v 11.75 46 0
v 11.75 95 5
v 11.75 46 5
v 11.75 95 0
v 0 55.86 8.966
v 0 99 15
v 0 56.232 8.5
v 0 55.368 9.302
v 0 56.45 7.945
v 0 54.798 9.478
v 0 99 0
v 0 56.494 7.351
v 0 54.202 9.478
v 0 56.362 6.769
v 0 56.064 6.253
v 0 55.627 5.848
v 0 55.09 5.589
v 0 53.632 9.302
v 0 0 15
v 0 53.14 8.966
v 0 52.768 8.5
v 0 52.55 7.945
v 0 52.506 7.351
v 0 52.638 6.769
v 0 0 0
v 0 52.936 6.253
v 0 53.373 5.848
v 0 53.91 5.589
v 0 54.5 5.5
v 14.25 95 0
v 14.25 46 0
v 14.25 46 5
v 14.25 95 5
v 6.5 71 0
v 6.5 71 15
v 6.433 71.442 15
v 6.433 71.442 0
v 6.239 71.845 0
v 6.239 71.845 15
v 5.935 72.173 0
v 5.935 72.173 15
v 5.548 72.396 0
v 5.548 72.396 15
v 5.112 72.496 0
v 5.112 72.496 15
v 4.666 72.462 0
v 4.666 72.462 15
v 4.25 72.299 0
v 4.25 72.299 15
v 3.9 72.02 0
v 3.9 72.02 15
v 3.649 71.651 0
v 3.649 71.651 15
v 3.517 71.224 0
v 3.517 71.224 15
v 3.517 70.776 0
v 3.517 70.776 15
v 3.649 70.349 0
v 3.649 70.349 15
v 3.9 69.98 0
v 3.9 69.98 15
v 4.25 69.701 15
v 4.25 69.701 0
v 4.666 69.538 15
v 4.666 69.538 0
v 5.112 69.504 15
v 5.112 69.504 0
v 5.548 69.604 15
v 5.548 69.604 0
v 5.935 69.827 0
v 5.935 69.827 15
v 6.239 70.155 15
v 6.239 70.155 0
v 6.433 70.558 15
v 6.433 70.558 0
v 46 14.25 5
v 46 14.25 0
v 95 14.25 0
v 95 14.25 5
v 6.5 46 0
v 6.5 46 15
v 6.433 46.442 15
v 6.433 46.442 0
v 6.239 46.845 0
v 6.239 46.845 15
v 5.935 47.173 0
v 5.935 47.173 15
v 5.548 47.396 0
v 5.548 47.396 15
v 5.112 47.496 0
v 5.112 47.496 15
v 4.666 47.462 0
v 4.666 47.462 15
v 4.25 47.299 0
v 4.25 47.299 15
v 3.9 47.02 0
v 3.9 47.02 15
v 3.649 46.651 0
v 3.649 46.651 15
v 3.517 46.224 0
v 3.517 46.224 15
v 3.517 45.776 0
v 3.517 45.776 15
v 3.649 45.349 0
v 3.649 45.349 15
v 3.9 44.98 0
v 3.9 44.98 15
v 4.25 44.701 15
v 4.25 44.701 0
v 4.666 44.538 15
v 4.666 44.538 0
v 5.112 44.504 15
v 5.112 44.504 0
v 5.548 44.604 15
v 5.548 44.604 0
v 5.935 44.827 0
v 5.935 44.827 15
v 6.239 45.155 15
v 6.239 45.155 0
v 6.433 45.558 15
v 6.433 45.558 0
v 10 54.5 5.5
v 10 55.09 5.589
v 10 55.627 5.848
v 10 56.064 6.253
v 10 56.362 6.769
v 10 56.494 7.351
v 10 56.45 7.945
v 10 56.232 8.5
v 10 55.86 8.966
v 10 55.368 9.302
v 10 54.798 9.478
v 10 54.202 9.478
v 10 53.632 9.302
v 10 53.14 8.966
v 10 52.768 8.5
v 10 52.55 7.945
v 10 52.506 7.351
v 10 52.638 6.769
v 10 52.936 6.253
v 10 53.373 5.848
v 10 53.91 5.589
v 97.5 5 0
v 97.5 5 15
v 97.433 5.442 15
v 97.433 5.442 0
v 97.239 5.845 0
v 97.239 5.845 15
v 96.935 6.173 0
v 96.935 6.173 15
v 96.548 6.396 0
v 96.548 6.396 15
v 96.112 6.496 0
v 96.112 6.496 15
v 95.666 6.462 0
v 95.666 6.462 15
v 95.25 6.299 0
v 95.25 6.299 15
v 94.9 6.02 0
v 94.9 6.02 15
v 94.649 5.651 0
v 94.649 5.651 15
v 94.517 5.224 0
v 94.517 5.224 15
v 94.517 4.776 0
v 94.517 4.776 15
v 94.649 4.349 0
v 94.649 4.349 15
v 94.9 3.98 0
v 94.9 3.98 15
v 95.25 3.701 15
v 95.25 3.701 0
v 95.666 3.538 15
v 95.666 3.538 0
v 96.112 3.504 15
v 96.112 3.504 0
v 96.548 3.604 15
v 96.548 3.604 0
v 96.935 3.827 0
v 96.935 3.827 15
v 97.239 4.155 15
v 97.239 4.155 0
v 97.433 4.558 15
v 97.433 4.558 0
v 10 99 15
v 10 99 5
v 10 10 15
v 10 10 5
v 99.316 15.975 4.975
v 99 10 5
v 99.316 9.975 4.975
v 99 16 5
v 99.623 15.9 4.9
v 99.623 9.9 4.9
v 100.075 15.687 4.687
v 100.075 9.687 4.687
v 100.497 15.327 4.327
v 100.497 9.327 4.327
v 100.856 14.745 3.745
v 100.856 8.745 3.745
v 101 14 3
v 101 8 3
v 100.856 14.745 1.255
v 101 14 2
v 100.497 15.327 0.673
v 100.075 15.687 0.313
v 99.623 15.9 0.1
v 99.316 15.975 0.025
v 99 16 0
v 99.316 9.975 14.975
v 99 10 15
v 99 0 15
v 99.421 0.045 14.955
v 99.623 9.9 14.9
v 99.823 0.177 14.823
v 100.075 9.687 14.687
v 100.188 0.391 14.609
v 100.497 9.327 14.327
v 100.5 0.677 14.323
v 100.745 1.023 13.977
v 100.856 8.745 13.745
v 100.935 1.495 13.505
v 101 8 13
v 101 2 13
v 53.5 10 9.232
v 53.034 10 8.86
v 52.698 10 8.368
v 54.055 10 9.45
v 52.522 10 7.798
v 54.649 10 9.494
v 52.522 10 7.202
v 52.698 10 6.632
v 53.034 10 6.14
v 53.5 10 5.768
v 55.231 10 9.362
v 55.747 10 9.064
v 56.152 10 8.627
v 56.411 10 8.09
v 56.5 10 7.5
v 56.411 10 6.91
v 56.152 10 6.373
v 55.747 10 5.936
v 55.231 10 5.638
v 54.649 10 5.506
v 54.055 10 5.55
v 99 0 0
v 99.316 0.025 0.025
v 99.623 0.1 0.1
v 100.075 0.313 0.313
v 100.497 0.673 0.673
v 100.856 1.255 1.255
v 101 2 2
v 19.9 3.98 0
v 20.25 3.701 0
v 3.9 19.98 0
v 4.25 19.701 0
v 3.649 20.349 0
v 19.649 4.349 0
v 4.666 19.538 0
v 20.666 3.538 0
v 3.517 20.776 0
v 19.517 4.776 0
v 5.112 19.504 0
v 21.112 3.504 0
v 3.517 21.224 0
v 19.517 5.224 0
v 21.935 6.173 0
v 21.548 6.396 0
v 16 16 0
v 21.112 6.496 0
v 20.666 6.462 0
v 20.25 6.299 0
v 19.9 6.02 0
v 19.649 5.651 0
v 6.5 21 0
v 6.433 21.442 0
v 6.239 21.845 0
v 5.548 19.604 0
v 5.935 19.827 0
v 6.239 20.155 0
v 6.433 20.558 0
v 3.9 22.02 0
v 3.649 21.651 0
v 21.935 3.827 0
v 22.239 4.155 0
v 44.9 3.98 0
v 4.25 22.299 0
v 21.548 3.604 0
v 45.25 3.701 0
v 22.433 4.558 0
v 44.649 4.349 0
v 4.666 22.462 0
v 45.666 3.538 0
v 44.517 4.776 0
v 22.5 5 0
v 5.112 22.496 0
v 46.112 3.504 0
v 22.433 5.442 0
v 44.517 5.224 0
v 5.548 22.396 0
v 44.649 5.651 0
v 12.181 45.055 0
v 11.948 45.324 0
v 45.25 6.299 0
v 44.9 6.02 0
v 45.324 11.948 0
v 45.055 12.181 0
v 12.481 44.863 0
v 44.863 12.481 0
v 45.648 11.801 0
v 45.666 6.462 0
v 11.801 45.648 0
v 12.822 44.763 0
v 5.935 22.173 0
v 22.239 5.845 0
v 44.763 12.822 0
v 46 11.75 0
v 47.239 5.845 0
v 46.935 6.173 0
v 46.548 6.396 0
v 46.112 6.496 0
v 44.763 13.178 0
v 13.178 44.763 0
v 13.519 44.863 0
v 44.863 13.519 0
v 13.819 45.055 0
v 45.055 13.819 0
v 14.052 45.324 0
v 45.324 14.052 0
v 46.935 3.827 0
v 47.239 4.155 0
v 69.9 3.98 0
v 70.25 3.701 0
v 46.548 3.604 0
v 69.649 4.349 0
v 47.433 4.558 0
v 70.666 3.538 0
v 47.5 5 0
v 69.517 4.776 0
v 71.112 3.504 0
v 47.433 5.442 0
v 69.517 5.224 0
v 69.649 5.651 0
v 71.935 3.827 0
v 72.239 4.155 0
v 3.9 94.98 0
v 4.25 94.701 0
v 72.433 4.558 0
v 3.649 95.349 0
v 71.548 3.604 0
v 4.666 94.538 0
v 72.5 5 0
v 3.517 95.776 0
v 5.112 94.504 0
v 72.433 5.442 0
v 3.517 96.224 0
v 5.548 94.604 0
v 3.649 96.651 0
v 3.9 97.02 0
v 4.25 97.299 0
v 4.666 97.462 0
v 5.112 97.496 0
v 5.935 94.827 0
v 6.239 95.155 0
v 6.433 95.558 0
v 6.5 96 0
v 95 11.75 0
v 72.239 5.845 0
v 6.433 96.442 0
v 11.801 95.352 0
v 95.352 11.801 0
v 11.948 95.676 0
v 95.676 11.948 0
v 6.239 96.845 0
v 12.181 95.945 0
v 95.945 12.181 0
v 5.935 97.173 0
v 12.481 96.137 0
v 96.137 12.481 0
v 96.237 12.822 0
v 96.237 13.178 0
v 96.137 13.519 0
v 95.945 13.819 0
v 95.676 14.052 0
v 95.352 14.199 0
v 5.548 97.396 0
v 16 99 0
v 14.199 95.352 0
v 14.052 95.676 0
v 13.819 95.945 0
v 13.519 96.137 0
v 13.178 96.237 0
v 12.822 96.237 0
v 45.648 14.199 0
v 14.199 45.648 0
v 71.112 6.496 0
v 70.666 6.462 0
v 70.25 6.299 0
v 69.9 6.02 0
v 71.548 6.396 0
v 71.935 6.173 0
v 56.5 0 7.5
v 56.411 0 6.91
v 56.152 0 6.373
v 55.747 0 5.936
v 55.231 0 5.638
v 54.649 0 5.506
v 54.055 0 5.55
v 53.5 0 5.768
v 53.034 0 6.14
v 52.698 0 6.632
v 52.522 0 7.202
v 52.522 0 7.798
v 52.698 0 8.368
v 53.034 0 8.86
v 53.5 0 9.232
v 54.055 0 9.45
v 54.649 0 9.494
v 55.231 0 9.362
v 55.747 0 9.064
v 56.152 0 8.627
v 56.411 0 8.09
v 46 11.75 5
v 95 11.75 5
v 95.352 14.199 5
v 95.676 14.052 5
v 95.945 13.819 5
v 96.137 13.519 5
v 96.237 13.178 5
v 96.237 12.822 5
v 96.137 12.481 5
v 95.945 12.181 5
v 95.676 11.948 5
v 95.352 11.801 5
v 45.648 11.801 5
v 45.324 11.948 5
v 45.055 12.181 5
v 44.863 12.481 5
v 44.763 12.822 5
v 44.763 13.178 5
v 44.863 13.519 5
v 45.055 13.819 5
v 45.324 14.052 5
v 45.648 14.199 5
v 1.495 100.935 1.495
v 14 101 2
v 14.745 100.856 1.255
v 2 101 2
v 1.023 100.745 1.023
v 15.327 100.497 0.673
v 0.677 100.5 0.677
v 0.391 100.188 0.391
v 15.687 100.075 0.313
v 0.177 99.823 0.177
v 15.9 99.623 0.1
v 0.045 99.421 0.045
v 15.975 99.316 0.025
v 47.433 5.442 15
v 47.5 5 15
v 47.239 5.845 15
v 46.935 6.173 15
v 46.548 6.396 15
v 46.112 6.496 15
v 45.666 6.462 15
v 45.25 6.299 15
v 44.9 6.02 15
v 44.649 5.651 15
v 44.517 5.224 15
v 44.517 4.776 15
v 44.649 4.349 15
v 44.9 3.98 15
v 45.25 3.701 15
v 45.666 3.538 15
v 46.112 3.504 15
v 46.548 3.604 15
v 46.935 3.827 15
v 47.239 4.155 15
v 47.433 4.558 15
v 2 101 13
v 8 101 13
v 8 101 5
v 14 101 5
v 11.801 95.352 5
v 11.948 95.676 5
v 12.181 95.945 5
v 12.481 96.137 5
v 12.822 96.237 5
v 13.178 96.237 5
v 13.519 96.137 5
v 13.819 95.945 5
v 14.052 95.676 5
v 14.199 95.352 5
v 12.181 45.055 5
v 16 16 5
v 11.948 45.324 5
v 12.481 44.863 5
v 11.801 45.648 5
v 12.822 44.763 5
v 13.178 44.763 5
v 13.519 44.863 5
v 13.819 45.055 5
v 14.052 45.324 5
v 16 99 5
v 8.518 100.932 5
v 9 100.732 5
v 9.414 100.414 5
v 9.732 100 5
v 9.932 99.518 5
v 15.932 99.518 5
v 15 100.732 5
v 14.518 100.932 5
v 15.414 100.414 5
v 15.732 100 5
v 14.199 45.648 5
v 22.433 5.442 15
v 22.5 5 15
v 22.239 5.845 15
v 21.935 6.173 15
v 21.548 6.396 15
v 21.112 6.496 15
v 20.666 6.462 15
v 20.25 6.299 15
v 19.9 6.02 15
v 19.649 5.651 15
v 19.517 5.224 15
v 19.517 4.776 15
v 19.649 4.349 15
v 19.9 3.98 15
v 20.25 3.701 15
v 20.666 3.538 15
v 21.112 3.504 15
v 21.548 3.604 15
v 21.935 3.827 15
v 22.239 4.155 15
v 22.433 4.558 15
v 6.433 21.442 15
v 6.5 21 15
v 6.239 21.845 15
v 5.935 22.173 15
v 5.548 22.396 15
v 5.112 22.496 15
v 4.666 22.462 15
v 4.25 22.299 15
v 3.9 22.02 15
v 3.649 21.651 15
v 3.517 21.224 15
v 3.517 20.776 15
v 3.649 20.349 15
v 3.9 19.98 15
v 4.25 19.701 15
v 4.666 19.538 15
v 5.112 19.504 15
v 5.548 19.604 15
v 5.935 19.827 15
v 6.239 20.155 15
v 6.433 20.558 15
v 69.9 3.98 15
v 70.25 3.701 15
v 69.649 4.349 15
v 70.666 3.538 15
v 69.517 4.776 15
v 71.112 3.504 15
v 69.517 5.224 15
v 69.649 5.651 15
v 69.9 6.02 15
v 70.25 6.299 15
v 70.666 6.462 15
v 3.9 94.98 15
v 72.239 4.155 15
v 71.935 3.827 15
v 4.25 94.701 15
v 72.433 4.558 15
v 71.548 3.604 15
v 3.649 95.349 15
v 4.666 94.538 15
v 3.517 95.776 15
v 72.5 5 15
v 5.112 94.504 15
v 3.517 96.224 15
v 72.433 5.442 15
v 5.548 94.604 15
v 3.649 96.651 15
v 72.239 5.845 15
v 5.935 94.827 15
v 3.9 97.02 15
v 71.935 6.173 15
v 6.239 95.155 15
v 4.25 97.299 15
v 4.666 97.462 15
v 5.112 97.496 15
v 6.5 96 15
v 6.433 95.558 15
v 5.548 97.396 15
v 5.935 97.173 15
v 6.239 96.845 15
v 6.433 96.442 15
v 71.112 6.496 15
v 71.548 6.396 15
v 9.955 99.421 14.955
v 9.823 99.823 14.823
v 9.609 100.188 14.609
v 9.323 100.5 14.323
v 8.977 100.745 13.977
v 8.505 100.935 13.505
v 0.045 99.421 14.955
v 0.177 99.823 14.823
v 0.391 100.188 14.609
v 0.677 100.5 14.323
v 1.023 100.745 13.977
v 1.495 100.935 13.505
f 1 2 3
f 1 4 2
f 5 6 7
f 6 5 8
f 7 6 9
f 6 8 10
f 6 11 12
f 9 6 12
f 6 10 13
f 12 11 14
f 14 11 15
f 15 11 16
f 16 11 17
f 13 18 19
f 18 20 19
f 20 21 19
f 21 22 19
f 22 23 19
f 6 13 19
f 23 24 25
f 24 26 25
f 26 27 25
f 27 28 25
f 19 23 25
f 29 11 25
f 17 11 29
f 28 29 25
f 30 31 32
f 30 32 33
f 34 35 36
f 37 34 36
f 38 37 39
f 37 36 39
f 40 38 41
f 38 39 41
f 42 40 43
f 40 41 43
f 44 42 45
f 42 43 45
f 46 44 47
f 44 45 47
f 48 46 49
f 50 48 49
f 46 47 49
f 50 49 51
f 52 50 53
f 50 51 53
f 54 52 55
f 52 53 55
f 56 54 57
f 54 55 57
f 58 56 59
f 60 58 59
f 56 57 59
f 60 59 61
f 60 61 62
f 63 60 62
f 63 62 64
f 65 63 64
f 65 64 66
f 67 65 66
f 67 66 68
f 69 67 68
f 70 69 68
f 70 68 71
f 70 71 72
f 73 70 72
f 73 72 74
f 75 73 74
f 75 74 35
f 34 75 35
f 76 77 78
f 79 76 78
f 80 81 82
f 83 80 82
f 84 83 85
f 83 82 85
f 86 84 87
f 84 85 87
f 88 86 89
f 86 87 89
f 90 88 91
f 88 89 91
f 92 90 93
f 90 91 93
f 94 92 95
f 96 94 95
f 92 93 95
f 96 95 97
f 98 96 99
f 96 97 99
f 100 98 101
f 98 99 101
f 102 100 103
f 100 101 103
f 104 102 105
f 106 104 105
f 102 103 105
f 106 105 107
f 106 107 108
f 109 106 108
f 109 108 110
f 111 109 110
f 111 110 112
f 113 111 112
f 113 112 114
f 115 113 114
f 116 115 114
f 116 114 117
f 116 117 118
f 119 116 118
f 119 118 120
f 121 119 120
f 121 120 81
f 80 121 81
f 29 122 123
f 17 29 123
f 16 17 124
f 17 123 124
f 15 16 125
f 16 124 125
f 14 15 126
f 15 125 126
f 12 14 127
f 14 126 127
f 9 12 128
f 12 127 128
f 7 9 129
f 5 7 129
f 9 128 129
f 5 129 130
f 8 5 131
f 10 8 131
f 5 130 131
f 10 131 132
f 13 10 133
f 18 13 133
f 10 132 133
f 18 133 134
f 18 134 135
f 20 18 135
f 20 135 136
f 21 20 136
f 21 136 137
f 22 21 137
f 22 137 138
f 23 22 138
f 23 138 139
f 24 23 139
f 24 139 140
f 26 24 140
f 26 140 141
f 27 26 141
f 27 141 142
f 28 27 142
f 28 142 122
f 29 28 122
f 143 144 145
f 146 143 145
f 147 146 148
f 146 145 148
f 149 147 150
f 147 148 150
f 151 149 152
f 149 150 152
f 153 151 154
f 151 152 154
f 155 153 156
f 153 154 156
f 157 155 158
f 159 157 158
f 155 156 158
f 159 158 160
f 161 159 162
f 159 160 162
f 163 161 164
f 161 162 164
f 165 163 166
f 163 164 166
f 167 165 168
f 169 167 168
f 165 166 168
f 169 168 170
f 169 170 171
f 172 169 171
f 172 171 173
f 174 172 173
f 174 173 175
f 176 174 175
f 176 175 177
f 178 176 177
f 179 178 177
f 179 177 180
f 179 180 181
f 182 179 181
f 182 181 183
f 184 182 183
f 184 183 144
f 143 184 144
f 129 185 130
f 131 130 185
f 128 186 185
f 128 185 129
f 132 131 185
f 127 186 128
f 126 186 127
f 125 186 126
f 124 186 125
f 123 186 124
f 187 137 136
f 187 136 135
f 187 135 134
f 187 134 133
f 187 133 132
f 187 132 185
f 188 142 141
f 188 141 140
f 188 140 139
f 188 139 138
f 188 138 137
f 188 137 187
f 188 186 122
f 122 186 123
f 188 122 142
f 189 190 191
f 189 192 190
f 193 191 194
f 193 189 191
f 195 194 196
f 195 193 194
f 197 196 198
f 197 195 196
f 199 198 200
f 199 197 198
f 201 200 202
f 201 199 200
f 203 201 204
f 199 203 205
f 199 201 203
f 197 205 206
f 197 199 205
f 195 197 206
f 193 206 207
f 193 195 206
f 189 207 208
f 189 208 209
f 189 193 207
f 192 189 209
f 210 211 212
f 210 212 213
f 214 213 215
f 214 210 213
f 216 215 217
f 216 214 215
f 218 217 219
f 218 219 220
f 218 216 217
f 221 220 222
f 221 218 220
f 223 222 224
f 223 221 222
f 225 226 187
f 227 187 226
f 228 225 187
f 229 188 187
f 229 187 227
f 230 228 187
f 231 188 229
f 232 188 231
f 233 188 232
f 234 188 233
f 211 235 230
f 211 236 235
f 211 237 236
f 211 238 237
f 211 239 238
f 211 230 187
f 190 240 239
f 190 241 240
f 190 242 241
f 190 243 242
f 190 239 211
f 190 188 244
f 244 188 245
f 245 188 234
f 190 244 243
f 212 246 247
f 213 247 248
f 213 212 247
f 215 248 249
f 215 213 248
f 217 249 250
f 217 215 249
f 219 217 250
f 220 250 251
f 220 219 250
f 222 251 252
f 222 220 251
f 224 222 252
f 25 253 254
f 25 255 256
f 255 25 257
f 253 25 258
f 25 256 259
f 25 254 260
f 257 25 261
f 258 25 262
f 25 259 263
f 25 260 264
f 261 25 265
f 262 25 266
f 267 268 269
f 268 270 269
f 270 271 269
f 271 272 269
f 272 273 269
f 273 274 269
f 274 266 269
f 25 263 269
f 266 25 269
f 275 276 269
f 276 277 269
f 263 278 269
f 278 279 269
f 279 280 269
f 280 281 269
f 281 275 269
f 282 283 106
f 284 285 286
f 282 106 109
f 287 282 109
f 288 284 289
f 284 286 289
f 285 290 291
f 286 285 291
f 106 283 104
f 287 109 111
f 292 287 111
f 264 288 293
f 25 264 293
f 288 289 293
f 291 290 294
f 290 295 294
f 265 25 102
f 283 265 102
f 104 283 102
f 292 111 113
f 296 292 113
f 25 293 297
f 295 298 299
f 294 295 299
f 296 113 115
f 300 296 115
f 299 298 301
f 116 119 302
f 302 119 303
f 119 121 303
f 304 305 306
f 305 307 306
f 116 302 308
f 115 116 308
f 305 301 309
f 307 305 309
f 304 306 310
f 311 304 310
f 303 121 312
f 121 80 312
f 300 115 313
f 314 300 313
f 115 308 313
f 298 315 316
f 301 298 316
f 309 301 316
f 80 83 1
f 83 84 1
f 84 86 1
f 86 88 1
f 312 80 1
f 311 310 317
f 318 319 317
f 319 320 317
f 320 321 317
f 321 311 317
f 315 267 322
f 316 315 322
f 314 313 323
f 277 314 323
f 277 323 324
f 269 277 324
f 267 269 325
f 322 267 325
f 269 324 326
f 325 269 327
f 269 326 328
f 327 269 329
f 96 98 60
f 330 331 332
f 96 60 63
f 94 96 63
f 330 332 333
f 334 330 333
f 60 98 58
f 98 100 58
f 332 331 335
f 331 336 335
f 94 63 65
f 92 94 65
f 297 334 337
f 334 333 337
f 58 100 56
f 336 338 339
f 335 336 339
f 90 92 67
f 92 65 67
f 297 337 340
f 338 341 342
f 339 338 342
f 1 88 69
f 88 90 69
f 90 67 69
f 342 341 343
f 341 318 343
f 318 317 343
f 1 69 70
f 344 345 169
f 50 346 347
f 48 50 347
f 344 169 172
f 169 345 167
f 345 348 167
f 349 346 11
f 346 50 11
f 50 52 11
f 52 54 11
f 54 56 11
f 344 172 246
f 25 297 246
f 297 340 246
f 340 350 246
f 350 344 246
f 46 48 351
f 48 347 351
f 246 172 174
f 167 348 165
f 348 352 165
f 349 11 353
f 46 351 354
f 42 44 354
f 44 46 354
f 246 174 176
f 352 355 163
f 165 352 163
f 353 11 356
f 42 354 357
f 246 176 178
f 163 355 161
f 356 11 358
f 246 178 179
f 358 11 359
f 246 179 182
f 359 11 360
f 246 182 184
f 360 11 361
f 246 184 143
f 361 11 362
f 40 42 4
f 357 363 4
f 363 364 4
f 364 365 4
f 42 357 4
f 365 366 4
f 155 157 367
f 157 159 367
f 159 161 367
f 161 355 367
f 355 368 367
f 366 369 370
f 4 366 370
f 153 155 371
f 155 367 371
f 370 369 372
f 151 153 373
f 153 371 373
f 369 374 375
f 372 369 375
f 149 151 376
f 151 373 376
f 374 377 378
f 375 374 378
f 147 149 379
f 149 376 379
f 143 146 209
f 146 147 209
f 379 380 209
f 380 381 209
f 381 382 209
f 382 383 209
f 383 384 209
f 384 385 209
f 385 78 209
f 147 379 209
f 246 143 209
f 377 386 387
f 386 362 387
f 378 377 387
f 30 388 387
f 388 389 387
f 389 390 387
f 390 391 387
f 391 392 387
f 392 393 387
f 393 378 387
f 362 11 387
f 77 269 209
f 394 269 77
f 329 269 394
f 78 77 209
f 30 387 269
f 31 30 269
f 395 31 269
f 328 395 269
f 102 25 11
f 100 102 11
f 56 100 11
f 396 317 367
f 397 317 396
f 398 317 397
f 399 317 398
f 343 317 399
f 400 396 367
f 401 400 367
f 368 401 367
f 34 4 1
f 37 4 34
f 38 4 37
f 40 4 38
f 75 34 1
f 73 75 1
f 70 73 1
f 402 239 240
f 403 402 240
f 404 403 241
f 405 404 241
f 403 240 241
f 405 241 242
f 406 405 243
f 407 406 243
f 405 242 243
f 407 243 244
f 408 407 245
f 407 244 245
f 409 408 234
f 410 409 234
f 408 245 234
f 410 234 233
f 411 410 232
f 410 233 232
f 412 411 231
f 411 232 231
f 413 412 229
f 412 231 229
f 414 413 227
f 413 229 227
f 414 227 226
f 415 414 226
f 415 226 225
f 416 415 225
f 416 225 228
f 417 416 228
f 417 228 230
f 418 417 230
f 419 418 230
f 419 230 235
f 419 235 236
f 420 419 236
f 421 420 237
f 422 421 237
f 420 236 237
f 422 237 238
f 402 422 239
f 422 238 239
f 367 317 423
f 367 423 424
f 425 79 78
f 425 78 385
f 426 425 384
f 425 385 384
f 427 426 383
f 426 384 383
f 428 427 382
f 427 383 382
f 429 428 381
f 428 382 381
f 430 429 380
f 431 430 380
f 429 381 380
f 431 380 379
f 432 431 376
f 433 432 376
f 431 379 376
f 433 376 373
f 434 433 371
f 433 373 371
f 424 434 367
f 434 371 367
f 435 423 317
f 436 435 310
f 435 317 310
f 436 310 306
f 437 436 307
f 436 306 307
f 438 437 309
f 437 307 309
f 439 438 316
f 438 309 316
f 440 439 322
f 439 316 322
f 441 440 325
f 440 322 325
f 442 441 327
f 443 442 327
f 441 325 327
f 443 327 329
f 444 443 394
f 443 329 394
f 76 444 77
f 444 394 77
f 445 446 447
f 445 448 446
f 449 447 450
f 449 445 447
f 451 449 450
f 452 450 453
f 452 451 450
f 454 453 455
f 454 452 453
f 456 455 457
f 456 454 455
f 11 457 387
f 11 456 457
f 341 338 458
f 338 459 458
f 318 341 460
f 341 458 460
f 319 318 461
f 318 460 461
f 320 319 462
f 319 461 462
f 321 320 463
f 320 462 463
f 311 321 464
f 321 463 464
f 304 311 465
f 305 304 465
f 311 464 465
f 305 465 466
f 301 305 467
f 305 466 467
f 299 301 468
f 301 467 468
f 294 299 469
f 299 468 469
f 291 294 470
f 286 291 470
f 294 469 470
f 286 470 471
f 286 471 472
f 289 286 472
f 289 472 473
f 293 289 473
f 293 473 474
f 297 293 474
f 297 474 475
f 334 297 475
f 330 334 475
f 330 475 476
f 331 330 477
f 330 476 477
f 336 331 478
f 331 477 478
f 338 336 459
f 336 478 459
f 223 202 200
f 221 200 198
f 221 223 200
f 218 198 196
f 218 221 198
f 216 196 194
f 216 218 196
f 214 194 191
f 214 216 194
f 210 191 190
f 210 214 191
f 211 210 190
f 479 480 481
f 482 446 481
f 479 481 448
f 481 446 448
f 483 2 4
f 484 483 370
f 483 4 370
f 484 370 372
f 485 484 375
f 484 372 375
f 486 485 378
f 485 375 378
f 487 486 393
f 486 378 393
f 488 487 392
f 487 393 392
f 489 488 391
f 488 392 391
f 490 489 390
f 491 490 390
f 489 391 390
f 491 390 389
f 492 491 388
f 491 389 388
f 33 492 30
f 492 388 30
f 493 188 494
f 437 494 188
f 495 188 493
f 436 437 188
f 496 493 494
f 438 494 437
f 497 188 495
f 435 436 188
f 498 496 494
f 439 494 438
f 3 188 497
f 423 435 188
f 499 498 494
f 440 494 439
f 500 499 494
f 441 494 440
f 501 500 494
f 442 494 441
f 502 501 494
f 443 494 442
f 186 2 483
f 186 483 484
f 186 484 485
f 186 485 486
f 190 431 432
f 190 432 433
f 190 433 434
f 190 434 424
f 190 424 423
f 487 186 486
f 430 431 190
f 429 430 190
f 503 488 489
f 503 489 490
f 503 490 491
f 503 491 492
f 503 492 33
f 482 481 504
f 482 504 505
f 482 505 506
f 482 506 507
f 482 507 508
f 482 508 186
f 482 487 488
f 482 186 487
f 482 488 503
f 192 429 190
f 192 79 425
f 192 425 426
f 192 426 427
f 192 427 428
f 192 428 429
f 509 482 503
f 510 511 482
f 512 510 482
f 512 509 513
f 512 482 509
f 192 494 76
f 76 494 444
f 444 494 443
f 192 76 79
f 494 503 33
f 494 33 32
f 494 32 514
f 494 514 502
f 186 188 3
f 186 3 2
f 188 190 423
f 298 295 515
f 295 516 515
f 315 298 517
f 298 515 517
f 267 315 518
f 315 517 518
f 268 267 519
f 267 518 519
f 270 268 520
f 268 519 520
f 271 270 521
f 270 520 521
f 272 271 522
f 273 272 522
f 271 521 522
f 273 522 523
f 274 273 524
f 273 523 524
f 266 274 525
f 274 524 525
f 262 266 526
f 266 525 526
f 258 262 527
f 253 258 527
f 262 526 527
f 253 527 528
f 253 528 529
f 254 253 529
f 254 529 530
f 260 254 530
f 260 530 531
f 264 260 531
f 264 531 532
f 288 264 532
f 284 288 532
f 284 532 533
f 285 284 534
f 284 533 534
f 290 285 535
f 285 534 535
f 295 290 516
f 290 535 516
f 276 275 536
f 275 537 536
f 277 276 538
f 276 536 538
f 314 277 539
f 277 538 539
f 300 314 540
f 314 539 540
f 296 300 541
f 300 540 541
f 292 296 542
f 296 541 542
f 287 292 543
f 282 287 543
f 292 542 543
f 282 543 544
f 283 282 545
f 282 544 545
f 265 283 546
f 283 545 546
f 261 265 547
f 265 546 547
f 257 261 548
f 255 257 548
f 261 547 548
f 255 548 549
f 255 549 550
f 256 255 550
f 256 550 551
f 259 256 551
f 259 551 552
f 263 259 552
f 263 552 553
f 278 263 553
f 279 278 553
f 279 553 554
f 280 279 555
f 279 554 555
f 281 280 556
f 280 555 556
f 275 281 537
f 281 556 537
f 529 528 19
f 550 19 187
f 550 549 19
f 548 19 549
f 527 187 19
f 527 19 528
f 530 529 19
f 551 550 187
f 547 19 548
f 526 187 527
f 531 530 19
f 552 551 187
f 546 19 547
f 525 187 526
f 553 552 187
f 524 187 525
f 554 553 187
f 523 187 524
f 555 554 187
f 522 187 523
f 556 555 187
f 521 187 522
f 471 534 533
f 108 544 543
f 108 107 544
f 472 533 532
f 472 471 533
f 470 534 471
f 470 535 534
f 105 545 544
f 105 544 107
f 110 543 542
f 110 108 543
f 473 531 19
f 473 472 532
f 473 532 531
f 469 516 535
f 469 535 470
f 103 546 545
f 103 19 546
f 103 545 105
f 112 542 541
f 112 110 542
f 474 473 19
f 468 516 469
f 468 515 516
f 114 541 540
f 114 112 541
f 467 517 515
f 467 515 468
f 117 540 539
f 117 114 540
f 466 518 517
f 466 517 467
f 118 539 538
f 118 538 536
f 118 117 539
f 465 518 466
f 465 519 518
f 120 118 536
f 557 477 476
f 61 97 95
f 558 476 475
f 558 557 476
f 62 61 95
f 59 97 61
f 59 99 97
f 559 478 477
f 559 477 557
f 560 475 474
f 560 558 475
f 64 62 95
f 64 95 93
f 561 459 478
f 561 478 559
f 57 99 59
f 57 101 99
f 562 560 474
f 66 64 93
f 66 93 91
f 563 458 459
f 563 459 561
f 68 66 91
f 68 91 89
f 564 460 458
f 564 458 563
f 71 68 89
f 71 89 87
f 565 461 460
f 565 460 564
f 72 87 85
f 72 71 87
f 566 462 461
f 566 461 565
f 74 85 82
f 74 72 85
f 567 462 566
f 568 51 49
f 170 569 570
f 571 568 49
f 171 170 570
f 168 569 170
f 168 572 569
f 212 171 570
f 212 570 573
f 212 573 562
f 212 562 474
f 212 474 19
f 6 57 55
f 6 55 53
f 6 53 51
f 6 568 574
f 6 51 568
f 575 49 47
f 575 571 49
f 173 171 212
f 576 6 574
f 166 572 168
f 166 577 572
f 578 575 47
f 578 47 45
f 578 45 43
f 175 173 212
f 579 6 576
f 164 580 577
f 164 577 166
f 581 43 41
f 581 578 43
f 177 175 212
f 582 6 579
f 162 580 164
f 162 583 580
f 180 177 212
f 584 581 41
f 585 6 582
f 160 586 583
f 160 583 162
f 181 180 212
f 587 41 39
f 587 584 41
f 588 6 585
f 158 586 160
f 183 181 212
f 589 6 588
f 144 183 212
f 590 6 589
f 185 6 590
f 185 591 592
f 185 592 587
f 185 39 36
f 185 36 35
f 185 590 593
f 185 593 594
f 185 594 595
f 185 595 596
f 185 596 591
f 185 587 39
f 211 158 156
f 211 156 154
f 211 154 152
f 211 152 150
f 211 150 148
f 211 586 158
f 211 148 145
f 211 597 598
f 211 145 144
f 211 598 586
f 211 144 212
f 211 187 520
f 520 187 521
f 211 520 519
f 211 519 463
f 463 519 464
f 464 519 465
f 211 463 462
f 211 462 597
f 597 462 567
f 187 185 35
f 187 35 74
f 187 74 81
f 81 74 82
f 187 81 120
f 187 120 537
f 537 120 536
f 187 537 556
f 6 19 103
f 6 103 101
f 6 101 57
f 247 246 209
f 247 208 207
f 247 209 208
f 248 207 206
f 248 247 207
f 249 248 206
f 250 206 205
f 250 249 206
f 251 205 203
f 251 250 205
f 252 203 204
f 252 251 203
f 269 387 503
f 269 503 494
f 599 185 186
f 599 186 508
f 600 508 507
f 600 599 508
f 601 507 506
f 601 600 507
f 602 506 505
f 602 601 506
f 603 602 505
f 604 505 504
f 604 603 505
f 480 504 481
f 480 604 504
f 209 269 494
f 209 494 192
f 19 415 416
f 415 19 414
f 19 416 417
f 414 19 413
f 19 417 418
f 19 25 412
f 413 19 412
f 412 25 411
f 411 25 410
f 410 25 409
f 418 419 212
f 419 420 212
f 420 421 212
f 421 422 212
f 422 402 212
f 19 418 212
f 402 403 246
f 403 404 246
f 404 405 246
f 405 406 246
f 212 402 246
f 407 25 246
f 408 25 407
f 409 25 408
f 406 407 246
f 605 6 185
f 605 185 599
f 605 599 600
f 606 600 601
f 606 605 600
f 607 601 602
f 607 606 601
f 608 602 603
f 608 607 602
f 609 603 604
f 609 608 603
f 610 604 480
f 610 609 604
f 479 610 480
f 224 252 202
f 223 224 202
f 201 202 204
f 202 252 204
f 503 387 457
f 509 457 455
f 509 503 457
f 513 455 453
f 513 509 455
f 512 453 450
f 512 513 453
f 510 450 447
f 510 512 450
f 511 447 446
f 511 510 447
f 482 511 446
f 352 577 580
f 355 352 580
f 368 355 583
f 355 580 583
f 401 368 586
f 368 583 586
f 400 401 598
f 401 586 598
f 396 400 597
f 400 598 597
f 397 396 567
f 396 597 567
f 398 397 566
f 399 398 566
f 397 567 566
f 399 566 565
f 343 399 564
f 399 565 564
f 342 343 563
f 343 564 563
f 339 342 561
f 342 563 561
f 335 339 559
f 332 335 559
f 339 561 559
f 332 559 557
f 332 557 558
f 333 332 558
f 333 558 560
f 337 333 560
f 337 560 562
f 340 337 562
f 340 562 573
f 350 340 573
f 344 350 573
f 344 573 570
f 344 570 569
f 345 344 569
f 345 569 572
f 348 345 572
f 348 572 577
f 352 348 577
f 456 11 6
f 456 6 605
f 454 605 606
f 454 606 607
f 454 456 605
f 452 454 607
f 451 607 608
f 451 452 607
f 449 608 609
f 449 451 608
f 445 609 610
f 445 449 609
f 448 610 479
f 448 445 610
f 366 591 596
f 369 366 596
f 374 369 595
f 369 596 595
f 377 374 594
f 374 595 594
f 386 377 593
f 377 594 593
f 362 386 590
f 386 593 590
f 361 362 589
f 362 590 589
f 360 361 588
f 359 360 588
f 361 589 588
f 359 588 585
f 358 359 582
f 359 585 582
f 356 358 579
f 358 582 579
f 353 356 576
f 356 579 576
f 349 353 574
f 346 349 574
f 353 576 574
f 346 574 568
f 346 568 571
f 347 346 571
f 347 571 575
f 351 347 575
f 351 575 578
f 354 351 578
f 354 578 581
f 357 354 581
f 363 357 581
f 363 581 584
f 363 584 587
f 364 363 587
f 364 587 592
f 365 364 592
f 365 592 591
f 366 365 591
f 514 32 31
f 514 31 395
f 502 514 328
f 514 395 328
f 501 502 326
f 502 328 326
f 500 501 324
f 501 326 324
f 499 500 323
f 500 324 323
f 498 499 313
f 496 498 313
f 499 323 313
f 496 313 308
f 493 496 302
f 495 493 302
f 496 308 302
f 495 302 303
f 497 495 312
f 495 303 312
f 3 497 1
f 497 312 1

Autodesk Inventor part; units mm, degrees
ref_plane "YZ Plane" through (0, 0, 0) normal (1, 0, 0) x (0, 1, 0)
ref_plane "XZ Plane" through (0, 0, 0) normal (0, 1, 0) x (-1, 0, 0)
ref_plane "XY Plane" through (0, 0, 0) normal (0, 0, 1) x (1, 0, 0)
sketch "Sketch1" plane through (0, 0, 0) normal (0, 0, 1) x (1, 0, 0)
  line L0 (0, 0) -> (0, 101)
  line L1 (0, 101) -> (10, 101)
  line L2 (10, 101) -> (16, 101)
  line L3 (16, 101) -> (16, 16)
  line L4 (16, 16) -> (101, 16)
  line L5 (101, 16) -> (101, 0)
  line L6 (101, 0) -> (0, 0)
  line L7 (16, 101) -> (13, 101)
  line L8 (13, 101) -> (13, 13)
  line L9 (13, 13) -> (101, 13)
  line L10 (16, 16) -> (13, 16)
  line L11 (16, 16) -> (16, 13)
  line L12 (10, 101) -> (10, 8)
  line L13 (10, 8) -> (101, 8)
  line L14 (16, 13) -> (46, 13)
  line L15 (101, 13) -> (95, 13)
  line L16 (13, 101) -> (13, 95)
  circle A0 centre (95, 13) radius 1.25
  circle A1 centre (46, 13) radius 1.25
  circle A2 centre (13, 95) radius 1.25
  line L17 (13, 16) -> (13, 46)
  circle A3 centre (13, 46) radius 1.25
  line L18 (11.75, 95) -> (11.75, 46)
  line L19 (14.25, 46) -> (14.25, 95)
  line L20 (46, 14.25) -> (95, 14.25)
  line L21 (46, 11.75) -> (95, 11.75)
  point P0 (58.5, 16)
  dimension "d0" = 101
  dimension "d1" = 10
  dimension "d2" = 6
  dimension "d3" = 101
  dimension "d4" = 16
  dimension "d32" = 3
  dimension "d34" = 3
  dimension "d35" = 30
  dimension "d36" = 6
  dimension "d37" = 6
  dimension "d38" = 2.5
  dimension "d39" = 2.5
  dimension "d40" = 2.5
  dimension "d41" = 30
  dimension "d42" = 2.5
extrude "Extrusion1" add sketch "Sketch1" along normal blind 5 contours L0 L1 L12 L13 L5 L6 | L2 L8 A2 L18 A3 L9 A1 L21 A0 L5 L13 L12 | L2 L3 L10 L8 A3 L19 A2 | L9 A0 L20 A1 L11 L4 L5 | L11 L9 L8 L10
sketch "Sketch2" plane through (0, 0, 5) normal (0, 0, 1) x (1, 0, 0)
  line L0 (101, 0) -> (101, 16) projected
  line L1 (101, 16) -> (16, 16) projected
  line L2 (16, 16) -> (16, 101) projected
  line L3 (16, 101) -> (0, 101) projected
  line L4 (0, 101) -> (0, 0) projected
  line L5 (0, 0) -> (101, 0) projected
  line L6 (0, 101) -> (10, 101)
  line L7 (10, 101) -> (10, 10)
  line L8 (10, 10) -> (101, 10)
  line L9 (101, 0) -> (101, 16) projected
  line L10 (101, 10) -> (101, 0)
  line L11 (101, 0) -> (0, 0)
  line L12 (0, 101) -> (0, 0)
  dimension "d7" = 10
  dimension "d8" = 10
extrude "Extrusion2" add sketch "Sketch2" along normal blind 10 contours L5 L4 L3 L7 L8 L0
sketch "Sketch3" plane through (0, 0, 15) normal (0, 0, 1) x (1, 0, 0)
  line L0 (10, 10) -> (10, 101) projected
  line L1 (10, 101) -> (0, 101) projected
  line L2 (0, 101) -> (0, 0) projected
  line L3 (0, 0) -> (101, 0) projected
  line L4 (101, 0) -> (101, 10) projected
  line L5 (101, 10) -> (10, 10) projected
  line L6 (0, 101) -> (5, 101)
  line L7 (5, 101) -> (5, 5)
  line L8 (5, 5) -> (101, 5)
  line L9 (10, 101) -> (10, 10) projected
  line L10 (10, 10) -> (101, 10) projected
  line L11 (101, 10) -> (101, 16) projected
  line L12 (101, 16) -> (16, 16) projected
  line L13 (16, 16) -> (16, 101) projected
  line L14 (16, 101) -> (10, 101) projected
  line L15 (5, 101) -> (5, 96)
  line L16 (5, 16) -> (5, 21)
  line L17 (16, 5) -> (21, 5)
  line L18 (101, 5) -> (96, 5)
  line L19 (5, 96) -> (5, 71)
  line L20 (5, 71) -> (5, 46)
  line L21 (21, 5) -> (46, 5)
  line L22 (46, 5) -> (71, 5)
  circle A0 centre (5, 96) radius 1.5
  circle A1 centre (5, 71) radius 1.5
  circle A2 centre (5, 46) radius 1.5
  circle A3 centre (5, 21) radius 1.5
  circle A4 centre (21, 5) radius 1.5
  circle A5 centre (46, 5) radius 1.5
  circle A6 centre (71, 5) radius 1.5
  circle A7 centre (96, 5) radius 1.5
  dimension "d11" = 5
  dimension "d12" = 5
  dimension "d13" = 85
  dimension "d14" = 5
  dimension "d15" = 5
  dimension "d16" = 5
  dimension "d17" = 5
  dimension "d18" = 25
  dimension "d19" = 25
  dimension "d20" = 25
  dimension "d21" = 25
  dimension "d22" = 3
  dimension "d23" = 3
  dimension "d24" = 3
  dimension "d25" = 3
  dimension "d26" = 3
  dimension "d27" = 3
  dimension "d28" = 3
  dimension "d29" = 3
  dimension "d47" = 25
  dimension "d48" = 25
extrude "Extrusion3" cut sketch "Sketch3" against normal blind 16 contours A0 L7 | L7 A0 | A7 L8 | L8 A7 | A1 L7 | L7 A1 | A6 L8 | L8 A6 | A2 L7 | L7 A2 | A5 L8 | L8 A5 | A3 L7 | L7 A3 | A4 L8 | L8 A4
fillet "Fillet1" radius 2 11 edges at (5, 101, 15) (10, 101, 10) (16, 101, 2.5) (8, 101, 0) (0, 101, 7.5) (101, 16, 2.5) (101, 8, 0) (101, 13, 5) (101, 10, 10) (101, 5, 15) (101, 0, 7.5)
sketch "Sketch5" plane through (10, 10, 15) normal (1, 0, 0) x (0, 0, -1)
  line L0 (0, 89) -> (10, 89) projected
  line L1 (0, 0) -> (0, 89) projected
  line L2 (10, 0) -> (0, 0) projected
  line L3 (10, 89) -> (10, 0) projected
  circle A0 centre (26.9628, 94.4324) radius 2
  line L4 (0, 89) -> (10, 89) projected
  line L5 (10, 89) -> (7.5, 89)
  line L6 (7.5, 89) -> (7.5, 44.5)
  circle A1 centre (7.5, 44.5) radius 2
  point P0 (15, -10)
  dimension "d49" = 10
  dimension "d50" = 89
  dimension "d51" = 4
  dimension "d52" = 2.5
  dimension "d53" = 44.5
  dimension "d54" = 4
extrude "Extrusion4" cut sketch "Sketch5" against normal blind 10 contours A1
sketch "Sketch6" plane through (10, 10, 15) normal (0, 1, 0) x (1, 0, 0)
  line L0 (89, 10) -> (89, 0) projected
  line L1 (0, 10) -> (89, 10) projected
  line L2 (0, 10) -> (0, 0) projected
  line L3 (89, 0) -> (0, 0) projected
  line L4 (0, 10) -> (0, 7.5)
  line L5 (0, 7.5) -> (44.5, 7.5)
  circle A0 centre (44.5, 7.5) radius 2
  point P0 (-10, 15)
  dimension "d57" = 2.5
  dimension "d58" = 44.5
  dimension "d59" = 4
extrude "Extrusion5" cut sketch "Sketch6" against normal blind 10 contours A0
equation "\"d3\" = d0"
equation "\"d4\" = d1 + d2"
equation "\"d32\" = 0.5 * d2"
equation "\"d34\" = d32"
equation "\"d36\" = 2 * d32"
equation "\"d37\" = d36"
equation "\"d39\" = d38"
equation "\"d40\" = d38"
equation "\"d41\" = d35"
equation "\"d42\" = d38"
equation "\"d7\" = d1"
equation "\"d8\" = d1"
equation "\"d11\" = 0.5 * d1"
equation "\"d14\" = d11"
equation "\"d15\" = d11"
equation "\"d16\" = d11"
equation "\"d17\" = d11"
equation "\"d18\" = -0.666667 * d14 + 0.333333 * d13"
equation "\"d19\" = d18"
equation "\"d20\" = d18"
equation "\"d21\" = d18"
equation "\"d23\" = d22"
equation "\"d24\" = d22"
equation "\"d25\" = d22"
equation "\"d26\" = d22"
equation "\"d27\" = d22"
equation "\"d28\" = d22"
equation "\"d29\" = d22"
equation "\"d47\" = d18"
equation "\"d48\" = d18"
equation "\"d30\" = d1 + d2"
equation "\"d53\" = 0.5 * d50"
equation "\"d54\" = d51"
equation "\"d57\" = d52"
equation "\"d58\" = d53"
equation "\"d59\" = d54"
properties part number "DUT Holder v1.0"
